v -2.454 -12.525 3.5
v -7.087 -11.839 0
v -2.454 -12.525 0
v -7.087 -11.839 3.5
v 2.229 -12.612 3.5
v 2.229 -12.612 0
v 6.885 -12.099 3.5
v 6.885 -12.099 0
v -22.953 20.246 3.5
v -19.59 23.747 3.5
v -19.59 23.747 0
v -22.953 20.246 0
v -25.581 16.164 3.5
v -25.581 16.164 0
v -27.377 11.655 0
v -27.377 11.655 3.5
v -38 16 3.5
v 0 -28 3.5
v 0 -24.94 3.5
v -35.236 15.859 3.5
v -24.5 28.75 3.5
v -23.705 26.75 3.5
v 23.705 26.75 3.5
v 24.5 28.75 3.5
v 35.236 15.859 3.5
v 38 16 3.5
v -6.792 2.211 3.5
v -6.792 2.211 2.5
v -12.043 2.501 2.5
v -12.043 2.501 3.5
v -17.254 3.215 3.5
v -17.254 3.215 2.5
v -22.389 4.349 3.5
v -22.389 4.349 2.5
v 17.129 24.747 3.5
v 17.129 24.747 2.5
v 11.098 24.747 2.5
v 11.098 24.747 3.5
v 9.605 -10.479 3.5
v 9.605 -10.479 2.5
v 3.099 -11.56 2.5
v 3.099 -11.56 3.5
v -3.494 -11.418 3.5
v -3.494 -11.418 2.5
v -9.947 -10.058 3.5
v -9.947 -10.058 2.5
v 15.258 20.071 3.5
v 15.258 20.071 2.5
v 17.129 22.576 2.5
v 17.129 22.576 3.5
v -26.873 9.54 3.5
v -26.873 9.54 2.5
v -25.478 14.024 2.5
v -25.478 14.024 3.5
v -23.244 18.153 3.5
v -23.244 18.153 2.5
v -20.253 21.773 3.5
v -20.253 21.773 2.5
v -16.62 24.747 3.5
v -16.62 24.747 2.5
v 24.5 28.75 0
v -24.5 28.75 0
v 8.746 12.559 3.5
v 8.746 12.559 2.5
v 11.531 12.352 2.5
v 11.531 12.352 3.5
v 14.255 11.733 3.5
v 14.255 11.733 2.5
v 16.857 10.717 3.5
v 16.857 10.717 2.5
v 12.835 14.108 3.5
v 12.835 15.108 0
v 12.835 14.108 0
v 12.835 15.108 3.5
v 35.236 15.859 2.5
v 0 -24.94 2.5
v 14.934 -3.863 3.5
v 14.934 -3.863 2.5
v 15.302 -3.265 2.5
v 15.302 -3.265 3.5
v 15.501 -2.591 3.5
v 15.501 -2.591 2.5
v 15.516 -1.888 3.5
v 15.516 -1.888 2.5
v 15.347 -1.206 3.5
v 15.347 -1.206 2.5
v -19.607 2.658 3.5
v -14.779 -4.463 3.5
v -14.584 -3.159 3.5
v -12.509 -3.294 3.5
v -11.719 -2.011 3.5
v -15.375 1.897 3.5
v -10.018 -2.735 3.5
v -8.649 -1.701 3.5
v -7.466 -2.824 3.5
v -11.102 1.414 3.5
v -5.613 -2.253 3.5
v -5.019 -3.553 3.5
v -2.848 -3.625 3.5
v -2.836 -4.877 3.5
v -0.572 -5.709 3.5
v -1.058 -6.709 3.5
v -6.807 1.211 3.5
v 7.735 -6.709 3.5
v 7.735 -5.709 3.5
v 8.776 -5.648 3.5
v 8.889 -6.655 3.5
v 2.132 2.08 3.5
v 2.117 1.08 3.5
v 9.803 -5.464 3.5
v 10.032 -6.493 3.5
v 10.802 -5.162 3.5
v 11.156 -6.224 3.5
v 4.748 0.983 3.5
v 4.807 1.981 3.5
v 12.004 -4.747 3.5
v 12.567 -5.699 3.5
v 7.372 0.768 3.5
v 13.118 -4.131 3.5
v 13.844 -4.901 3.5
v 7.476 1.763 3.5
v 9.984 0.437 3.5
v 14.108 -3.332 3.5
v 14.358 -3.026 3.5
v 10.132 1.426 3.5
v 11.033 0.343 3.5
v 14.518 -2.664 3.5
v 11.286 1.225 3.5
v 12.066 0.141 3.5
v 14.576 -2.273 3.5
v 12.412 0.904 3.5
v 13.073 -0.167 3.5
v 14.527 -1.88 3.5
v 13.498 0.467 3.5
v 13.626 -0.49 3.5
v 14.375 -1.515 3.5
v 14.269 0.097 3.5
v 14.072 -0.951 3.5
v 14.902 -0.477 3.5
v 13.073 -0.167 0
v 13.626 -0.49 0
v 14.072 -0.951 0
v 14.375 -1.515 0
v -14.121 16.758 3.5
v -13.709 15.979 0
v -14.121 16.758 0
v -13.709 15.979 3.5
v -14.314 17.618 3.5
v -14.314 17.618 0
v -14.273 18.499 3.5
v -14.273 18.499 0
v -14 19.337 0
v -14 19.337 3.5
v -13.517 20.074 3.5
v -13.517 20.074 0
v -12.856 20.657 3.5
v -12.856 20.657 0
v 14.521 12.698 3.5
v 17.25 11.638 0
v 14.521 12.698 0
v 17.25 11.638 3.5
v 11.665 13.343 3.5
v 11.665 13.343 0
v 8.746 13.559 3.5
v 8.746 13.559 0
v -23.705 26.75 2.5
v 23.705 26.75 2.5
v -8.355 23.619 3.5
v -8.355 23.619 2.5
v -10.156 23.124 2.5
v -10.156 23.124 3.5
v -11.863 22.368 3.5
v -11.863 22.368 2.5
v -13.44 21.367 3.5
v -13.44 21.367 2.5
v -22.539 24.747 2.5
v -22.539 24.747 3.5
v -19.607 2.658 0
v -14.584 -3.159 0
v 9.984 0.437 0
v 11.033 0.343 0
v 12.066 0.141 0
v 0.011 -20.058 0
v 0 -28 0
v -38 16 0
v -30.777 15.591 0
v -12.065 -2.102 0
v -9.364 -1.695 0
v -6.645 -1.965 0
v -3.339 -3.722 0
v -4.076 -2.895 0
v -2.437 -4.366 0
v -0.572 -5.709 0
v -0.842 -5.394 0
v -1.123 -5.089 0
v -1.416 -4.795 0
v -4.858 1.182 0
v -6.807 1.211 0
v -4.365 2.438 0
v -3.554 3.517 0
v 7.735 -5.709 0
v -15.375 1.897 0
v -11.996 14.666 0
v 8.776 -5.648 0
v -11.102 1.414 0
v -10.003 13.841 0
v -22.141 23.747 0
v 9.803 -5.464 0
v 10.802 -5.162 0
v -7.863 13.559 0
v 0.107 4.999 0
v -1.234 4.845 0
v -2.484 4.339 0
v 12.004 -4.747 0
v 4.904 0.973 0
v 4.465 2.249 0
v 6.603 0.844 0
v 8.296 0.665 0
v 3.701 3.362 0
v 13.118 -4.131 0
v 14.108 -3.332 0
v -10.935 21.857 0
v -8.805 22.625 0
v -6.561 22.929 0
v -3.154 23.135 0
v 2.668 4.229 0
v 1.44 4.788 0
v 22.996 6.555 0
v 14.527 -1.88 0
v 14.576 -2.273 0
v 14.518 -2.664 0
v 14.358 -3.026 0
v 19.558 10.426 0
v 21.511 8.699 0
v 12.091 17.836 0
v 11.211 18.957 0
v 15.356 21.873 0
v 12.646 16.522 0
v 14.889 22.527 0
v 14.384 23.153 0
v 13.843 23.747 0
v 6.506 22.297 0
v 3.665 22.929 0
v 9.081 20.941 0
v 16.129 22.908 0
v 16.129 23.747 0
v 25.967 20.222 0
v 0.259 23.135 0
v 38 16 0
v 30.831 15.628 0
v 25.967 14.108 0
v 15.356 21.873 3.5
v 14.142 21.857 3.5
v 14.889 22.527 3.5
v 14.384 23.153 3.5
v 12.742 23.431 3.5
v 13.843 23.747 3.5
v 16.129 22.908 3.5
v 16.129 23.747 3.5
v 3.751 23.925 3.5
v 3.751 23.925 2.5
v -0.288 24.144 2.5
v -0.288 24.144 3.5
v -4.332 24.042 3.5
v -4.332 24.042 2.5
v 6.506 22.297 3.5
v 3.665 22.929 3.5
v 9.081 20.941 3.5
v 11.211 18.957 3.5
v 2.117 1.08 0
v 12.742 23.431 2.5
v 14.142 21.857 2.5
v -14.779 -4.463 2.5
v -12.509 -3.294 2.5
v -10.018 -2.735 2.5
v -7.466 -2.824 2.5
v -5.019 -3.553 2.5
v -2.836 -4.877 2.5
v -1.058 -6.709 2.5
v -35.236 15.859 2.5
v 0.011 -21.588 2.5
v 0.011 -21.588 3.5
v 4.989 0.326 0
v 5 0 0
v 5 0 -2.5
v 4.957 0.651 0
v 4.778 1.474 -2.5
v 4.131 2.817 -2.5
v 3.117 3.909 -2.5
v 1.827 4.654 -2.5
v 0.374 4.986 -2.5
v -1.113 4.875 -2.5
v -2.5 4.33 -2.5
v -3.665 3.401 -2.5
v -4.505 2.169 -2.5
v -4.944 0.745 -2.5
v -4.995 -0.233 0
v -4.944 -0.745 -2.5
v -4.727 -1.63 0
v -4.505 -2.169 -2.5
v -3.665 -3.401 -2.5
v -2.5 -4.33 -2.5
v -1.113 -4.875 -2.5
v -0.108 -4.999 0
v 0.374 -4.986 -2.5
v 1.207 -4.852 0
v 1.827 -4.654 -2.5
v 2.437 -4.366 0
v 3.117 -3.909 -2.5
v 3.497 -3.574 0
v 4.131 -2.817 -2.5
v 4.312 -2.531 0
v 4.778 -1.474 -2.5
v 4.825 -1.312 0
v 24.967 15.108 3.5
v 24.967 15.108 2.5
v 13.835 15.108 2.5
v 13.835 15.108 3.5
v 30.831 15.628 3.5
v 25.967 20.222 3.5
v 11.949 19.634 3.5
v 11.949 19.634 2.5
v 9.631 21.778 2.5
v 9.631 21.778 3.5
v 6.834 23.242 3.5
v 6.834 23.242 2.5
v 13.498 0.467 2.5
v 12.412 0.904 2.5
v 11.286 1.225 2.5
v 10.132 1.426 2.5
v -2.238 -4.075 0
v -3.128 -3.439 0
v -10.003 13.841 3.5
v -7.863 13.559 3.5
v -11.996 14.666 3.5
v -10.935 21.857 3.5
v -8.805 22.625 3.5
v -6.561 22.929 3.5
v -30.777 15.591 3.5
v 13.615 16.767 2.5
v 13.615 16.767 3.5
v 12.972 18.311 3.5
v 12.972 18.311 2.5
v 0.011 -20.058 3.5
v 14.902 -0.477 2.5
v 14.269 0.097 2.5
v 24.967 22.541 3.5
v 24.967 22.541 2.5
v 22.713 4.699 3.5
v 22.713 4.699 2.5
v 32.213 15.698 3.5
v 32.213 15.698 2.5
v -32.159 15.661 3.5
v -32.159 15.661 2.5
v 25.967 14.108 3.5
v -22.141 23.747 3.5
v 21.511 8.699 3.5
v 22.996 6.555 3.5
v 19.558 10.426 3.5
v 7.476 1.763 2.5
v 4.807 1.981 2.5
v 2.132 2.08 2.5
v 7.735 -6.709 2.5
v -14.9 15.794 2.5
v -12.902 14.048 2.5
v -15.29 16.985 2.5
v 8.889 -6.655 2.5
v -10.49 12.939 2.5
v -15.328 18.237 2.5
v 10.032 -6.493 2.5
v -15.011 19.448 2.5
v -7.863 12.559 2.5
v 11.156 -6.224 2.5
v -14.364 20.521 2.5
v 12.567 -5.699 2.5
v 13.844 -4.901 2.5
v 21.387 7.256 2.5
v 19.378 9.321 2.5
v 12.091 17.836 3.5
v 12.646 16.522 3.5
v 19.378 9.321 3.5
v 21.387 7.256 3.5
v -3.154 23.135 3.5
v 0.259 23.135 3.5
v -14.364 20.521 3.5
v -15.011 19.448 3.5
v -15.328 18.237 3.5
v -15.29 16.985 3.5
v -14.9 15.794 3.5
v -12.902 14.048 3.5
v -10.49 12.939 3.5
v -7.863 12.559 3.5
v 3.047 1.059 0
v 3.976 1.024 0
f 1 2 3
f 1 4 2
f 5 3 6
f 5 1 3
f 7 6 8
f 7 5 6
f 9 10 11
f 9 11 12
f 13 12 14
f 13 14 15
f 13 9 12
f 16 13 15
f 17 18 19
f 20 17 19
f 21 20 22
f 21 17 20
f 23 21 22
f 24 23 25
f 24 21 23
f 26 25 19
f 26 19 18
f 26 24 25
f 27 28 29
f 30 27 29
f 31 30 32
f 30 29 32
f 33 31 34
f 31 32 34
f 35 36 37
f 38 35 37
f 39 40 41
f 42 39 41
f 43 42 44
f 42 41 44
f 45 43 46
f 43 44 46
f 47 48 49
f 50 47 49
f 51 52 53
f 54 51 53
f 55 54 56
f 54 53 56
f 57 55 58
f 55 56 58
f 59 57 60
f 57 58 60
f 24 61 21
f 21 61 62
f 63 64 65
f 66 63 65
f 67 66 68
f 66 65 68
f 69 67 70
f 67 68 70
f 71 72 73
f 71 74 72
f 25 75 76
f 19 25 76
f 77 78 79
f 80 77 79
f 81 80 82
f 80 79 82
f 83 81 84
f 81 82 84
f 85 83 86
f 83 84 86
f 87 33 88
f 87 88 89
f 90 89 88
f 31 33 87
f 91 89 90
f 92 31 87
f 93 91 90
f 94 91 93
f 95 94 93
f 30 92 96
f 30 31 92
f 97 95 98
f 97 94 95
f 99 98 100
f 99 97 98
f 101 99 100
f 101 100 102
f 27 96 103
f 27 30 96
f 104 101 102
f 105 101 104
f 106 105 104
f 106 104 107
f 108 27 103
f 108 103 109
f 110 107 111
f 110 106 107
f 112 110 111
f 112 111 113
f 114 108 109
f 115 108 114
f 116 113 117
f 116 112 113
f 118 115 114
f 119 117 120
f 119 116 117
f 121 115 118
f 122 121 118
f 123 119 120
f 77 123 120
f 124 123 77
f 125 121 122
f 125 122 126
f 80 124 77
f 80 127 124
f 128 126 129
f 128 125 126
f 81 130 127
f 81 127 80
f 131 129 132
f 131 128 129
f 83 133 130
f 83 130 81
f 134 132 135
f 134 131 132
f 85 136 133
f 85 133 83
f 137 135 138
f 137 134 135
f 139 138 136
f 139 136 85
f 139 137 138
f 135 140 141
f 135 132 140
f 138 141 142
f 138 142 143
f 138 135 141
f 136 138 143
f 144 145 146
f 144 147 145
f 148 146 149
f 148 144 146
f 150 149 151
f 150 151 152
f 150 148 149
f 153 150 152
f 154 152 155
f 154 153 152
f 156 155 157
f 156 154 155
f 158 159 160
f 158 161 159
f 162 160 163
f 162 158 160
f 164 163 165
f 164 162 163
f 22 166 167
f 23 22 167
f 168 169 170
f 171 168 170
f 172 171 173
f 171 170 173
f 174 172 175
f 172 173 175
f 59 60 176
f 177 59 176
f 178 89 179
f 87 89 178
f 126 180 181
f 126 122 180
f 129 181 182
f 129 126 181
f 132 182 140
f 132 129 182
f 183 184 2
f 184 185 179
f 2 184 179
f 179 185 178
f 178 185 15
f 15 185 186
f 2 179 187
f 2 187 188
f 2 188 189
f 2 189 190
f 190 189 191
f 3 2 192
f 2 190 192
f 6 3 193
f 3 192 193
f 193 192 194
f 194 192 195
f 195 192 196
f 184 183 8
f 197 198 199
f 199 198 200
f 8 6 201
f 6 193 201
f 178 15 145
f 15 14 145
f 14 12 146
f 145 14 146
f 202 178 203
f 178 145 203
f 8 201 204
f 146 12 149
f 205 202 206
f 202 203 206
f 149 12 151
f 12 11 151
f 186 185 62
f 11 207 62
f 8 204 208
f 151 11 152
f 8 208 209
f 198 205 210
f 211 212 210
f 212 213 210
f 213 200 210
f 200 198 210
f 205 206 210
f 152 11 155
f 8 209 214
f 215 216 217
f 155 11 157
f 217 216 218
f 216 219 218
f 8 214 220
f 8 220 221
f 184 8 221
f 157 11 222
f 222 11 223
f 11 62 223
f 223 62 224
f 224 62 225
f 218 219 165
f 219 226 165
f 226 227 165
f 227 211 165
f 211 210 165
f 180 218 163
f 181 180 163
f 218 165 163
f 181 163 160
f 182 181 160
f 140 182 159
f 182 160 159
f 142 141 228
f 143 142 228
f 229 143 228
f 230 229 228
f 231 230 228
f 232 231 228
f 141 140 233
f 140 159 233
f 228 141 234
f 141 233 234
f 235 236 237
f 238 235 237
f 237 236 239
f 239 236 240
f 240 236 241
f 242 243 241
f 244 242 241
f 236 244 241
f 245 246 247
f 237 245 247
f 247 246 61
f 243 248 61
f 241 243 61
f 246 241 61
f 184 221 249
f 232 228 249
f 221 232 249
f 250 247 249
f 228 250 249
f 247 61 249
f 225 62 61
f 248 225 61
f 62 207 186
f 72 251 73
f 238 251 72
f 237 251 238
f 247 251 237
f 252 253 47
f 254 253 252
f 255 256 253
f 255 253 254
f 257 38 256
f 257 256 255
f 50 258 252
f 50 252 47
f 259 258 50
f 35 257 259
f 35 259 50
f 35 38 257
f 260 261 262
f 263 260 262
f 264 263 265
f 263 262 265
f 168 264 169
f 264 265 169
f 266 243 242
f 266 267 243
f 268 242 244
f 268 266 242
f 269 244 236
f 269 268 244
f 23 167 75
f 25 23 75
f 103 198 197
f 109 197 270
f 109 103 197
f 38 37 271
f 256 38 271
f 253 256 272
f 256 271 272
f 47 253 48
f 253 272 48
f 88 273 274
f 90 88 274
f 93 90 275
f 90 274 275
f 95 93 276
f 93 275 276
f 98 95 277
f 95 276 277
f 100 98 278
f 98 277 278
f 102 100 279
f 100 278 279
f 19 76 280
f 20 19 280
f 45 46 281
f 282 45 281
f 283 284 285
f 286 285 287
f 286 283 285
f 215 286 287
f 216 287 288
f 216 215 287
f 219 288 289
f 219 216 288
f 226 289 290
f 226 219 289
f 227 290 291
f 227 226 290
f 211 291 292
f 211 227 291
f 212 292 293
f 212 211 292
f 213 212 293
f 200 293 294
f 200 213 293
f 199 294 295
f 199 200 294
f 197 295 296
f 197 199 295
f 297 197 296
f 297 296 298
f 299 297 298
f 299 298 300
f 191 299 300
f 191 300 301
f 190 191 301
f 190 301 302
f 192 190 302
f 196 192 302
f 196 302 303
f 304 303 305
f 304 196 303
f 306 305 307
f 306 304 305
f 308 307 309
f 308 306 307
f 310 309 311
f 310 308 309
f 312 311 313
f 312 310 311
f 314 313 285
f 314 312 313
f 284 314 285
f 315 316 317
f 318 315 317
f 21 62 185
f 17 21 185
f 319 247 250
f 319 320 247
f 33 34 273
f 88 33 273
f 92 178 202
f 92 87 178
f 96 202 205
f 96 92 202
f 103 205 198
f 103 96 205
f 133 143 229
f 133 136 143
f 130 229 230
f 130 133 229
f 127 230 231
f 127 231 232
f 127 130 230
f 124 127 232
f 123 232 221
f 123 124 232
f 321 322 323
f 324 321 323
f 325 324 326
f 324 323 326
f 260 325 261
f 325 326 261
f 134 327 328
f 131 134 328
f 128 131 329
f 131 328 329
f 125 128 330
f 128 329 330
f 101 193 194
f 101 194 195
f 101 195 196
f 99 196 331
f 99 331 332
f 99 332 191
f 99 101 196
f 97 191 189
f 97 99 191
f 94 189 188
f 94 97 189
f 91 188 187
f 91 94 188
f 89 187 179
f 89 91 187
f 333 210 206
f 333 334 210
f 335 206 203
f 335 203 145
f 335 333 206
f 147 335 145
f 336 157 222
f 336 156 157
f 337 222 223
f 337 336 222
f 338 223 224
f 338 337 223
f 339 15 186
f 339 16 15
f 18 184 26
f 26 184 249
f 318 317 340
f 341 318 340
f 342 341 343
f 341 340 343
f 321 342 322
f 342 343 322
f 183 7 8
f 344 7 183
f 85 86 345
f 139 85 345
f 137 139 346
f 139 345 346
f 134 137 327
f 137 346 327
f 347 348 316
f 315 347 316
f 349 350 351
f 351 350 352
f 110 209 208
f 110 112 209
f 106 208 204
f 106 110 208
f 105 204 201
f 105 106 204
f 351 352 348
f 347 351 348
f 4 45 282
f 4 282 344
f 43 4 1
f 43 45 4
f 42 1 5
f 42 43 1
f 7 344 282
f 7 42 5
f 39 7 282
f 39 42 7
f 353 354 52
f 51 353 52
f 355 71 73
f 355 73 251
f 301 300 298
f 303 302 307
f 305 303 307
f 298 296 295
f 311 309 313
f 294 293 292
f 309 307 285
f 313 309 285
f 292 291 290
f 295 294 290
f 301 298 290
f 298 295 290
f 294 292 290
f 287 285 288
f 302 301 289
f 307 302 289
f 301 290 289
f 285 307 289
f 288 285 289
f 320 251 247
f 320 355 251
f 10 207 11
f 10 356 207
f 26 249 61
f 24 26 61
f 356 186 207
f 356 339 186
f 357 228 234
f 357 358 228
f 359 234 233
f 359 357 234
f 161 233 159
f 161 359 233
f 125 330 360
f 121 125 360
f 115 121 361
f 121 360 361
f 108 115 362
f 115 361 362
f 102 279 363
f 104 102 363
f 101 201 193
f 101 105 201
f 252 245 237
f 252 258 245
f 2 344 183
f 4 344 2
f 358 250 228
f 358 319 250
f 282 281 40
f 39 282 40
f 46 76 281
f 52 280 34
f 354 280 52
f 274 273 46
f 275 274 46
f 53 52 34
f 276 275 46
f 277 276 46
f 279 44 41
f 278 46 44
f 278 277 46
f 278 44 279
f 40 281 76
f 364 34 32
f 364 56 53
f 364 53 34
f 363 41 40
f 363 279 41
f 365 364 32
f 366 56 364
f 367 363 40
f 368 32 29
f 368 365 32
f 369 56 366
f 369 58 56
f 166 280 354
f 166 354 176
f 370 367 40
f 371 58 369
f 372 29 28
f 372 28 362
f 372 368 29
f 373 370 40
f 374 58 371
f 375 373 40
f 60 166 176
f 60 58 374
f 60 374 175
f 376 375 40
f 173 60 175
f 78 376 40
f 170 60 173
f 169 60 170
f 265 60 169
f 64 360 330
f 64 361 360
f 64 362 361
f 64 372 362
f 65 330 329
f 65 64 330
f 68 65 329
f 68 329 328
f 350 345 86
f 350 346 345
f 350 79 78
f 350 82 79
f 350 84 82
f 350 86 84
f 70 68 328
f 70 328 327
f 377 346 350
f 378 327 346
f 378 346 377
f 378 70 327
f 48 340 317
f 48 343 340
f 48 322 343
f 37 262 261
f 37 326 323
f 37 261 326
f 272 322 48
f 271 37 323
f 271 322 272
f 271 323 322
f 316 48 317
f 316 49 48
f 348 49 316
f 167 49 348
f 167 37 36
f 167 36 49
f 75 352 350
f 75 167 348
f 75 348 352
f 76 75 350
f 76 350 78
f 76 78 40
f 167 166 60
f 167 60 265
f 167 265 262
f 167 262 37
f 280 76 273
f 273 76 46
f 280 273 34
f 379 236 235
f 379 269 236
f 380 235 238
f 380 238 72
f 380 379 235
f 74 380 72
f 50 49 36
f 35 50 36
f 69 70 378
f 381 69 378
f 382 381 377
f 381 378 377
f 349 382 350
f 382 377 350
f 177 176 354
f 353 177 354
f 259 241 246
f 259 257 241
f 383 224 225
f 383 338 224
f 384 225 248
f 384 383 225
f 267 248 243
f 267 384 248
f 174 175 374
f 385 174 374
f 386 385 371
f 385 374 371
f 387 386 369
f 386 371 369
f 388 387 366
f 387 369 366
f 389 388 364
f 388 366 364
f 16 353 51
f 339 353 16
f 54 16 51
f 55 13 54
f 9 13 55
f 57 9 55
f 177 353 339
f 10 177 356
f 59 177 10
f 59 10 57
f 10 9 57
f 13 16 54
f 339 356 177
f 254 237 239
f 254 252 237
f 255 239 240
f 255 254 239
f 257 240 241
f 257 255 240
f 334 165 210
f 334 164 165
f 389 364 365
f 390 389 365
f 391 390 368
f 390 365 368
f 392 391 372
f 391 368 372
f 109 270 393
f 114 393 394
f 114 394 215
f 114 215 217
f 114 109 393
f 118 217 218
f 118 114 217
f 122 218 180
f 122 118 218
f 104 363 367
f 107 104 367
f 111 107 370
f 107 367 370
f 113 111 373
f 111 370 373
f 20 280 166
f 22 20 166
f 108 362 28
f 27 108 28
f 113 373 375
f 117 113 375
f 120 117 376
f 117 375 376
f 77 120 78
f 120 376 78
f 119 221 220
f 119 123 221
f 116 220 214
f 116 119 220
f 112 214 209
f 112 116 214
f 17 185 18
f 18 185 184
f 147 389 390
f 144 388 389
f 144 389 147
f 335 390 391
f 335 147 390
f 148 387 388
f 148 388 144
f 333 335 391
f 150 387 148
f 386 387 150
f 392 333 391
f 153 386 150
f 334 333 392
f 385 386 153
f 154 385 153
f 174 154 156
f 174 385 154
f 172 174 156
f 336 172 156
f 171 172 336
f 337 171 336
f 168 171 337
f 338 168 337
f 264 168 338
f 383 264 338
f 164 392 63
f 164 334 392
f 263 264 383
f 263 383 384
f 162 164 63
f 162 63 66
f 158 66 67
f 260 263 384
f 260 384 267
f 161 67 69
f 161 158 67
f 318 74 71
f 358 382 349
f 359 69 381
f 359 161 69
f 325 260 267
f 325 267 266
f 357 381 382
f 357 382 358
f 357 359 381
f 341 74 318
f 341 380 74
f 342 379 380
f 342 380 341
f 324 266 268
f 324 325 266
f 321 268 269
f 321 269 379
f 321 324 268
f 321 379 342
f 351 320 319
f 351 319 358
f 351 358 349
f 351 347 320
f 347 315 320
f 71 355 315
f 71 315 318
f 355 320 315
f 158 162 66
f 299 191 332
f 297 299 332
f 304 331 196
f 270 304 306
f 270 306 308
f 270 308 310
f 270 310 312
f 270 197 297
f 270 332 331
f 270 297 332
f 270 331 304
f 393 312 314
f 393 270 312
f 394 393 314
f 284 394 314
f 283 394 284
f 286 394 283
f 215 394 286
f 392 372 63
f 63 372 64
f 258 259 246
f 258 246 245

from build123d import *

# Parameters (mm, degrees)
F1_DEPTH = 2.5
F3_DEPTH = 1
F4_DEPTH = 2.5
F5_R     = 5
F6_DEPTH = 2.5


with BuildPart() as f1:
    # F0 (on Top) → F1 (new body)
    with BuildSketch(Plane.XY):
        Polygon((24.5, 28.75), (-24.5, 28.75), (-38, 16), (0, -28), (38, 16), align=None)
    extrude(amount=F1_DEPTH)

    # F2 (on face) → F3 (join)
    with BuildSketch(Plane.XY.offset(2.5)):
        Polygon((-24.5, 28.75), (-38, 16), (0, -28), (38, 16), (24.5, 28.75), align=None)
        Polygon((0, -24.9401175045), (-35.2360005395, 15.8594620676), (-23.7048427287, 26.75), (23.7048427287, 26.75), (35.2360005395, 15.8594620676), align=None, mode=Mode.SUBTRACT)
        with BuildLine():
            Line((22.7133916393, 4.6985002576), (32.2128970418, 15.6979275658))
            Line((32.2128970418, 15.6979275658), (24.9667909899, 22.5414721704))
            Line((24.9667909899, 22.5414721704), (24.9667909899, 15.1083281487))
            Line((24.9667909899, 15.1083281487), (13.8348590806, 15.1083281487))
            ThreePointArc((13.8348590806, 15.1083281487), (13.3444397283, 17.5599116804), (11.9486611802, 19.6341766584))
            ThreePointArc((11.9486611802, 19.6341766584), (8.2805304238, 22.6022293507), (3.7511971493, 23.9249765365))
            ThreePointArc((3.7511971493, 23.9249765365), (-2.3107858295, 24.1330407686), (-8.3545236117, 23.6190738634))
            ThreePointArc((-8.3545236117, 23.6190738634), (-11.0235311437, 22.7778125064), (-13.4403547272, 21.3670376688))
            ThreePointArc((-13.4403547272, 21.3670376688), (-15.212702444, 18.8538109385), (-14.9003509432, 15.7944055113))
            ThreePointArc((-14.9003509432, 15.7944055113), (-11.7357211664, 13.4067953643), (-7.8630894423, 12.5592770055))
            Line((-7.8630894423, 12.5592770055), (8.745636791, 12.5592770055))
            ThreePointArc((8.745636791, 12.5592770055), (12.9047041932, 12.0930390125), (16.8573021999, 10.7174705771))
            ThreePointArc((16.8573021999, 10.7174705771), (20.4582682574, 8.3626966604), (22.7133916393, 4.6985002576))
        make_face()
        with BuildLine():
            Line((25.9667909899, 14.1083281487), (25.9667909899, 20.2215367922))
            Line((25.9667909899, 20.2215367922), (30.8308973116, 15.6276585996))
            Line((30.8308973116, 15.6276585996), (22.9958176649, 6.5554611139))
            ThreePointArc((22.9958176649, 6.5554611139), (20.586748465, 9.6210283517), (17.2501383205, 11.6380433846))
            ThreePointArc((17.2501383205, 11.6380433846), (13.1050428541, 13.0729920976), (8.745636791, 13.5592770055))
            Line((8.745636791, 13.5592770055), (-7.8630894423, 13.5592770055))
            ThreePointArc((-7.8630894423, 13.5592770055), (-11.026529119, 14.1881083225), (-13.7089760974, 15.9789901227))
            ThreePointArc((-13.7089760974, 15.9789901227), (-14.2725466885, 18.498722854), (-12.8559581935, 20.6574127078))
            ThreePointArc((-12.8559581935, 20.6574127078), (-9.8904154712, 22.2976951419), (-6.5607260913, 22.9286774993))
            ThreePointArc((-6.5607260913, 22.9286774993), (-1.4477418736, 23.1604030388), (3.6652423441, 22.9286774993))
            ThreePointArc((3.6652423441, 22.9286774993), (7.8388006263, 21.704705466), (11.2106185406, 18.9574267715))
            ThreePointArc((11.2106185406, 18.9574267715), (12.4121725039, 17.1972104778), (12.8348590806, 15.1083281487))
            Line((12.8348590806, 15.1083281487), (12.8348590806, 14.1083281487))
            Line((12.8348590806, 14.1083281487), (25.9667909899, 14.1083281487))
        make_face(mode=Mode.SUBTRACT)
        with BuildLine():
            ThreePointArc((-6.7919120193, 2.210722072), (-14.655775713, 2.8051401774), (-22.3894476737, 4.349161901))
            Line((-22.3894476737, 4.349161901), (-14.7787371056, -4.4632398095))
            ThreePointArc((-14.7787371056, -4.4632398095), (-7.466030983, -2.8237135208), (-1.0576881468, -6.709181238))
            Line((-1.0576881468, -6.709181238), (7.7347876504, -6.709181238))
            ThreePointArc((7.7347876504, -6.709181238), (9.4624521238, -6.5873541357), (11.1559238285, -6.2242839485))
            ThreePointArc((11.1559238285, -6.2242839485), (13.2256284307, -5.3326624688), (14.9340350181, -3.8629642222))
            ThreePointArc((14.9340350181, -3.8629642222), (15.5006827522, -2.59072721), (15.3472675011, -1.2064799666))
            ThreePointArc((15.3472675011, -1.2064799666), (14.6061136564, -0.1669001783), (13.4981097654, 0.4674203519))
            ThreePointArc((13.4981097654, 0.4674203519), (11.8530830846, 1.0796158365), (10.1323601002, 1.4260382698))
            ThreePointArc((10.1323601002, 1.4260382698), (6.1429657723, 1.8869809032), (2.1316759441, 2.0800848343))
            Line((2.1316759441, 2.0800848343), (-6.7919120193, 2.210722072))
        make_face()
        with BuildLine():
            Line((-14.5836983502, -3.1591329101), (-19.6073624646, 2.6577413276))
            ThreePointArc((-19.6073624646, 2.6577413276), (-13.2424037369, 1.6206816287), (-6.8065499924, 1.2108292129))
            Line((-6.8065499924, 1.2108292129), (2.1170379709, 1.0801919752))
            ThreePointArc((2.1170379709, 1.0801919752), (6.0614887398, 0.8903056837), (9.9844088472, 0.4370436152))
            ThreePointArc((9.9844088472, 0.4370436152), (11.5520586297, 0.255045089), (13.0727859214, -0.1669001783))
            ThreePointArc((13.0727859214, -0.1669001783), (13.8649438936, -0.7048016123), (14.3747050315, -1.5153543791))
            ThreePointArc((14.3747050315, -1.5153543791), (14.560516724, -2.4704828367), (14.1075737774, -3.3316675108))
            ThreePointArc((14.1075737774, -3.3316675108), (12.5743410862, -4.4628960627), (10.8017250896, -5.16169006))
            ThreePointArc((10.8017250896, -5.16169006), (9.2924984584, -5.5712350402), (7.7347876504, -5.709181238))
            Line((7.7347876504, -5.709181238), (-0.5720290784, -5.709181238))
            ThreePointArc((-0.5720290784, -5.709181238), (-7.1112455745, -1.8702452534), (-14.5836983502, -3.1591329101))
        make_face(mode=Mode.SUBTRACT)
        with BuildLine():
            ThreePointArc((9.6052747881, -10.4793192543), (-0.2005916003, -11.6422682343), (-9.9472034322, -10.0576472208))
            Line((-9.9472034322, -10.0576472208), (0.0111213288, -21.5883390493))
            Line((0.0111213288, -21.5883390493), (9.6052747881, -10.4793192543))
        make_face()
        with BuildLine():
            Line((0.0111213288, -20.0583978016), (-7.0874587678, -11.8389892686))
            ThreePointArc((-7.0874587678, -11.8389892686), (-0.1135902043, -12.6442154046), (6.8853861251, -12.0987227742))
            Line((6.8853861251, -12.0987227742), (0.0111213288, -20.0583978016))
        make_face(mode=Mode.SUBTRACT)
        with BuildLine():
            Line((-22.5385466175, 24.7468773517), (-32.1588185263, 15.6610649934))
            Line((-32.1588185263, 15.6610649934), (-26.8728109728, 9.5404246683))
            ThreePointArc((-26.8728109728, 9.5404246683), (-23.2437339896, 18.1532901464), (-16.6198182851, 24.7468773517))
            Line((-16.6198182851, 24.7468773517), (-22.5385466175, 24.7468773517))
        make_face()
        with BuildLine():
            Line((-27.3773424364, 11.6545602424), (-30.7768187961, 15.5907960272))
            Line((-30.7768187961, 15.5907960272), (-22.1409679819, 23.7468773517))
            Line((-22.1409679819, 23.7468773517), (-19.5902141433, 23.7468773517))
            ThreePointArc((-19.5902141433, 23.7468773517), (-24.3653920595, 18.2684544483), (-27.3773424364, 11.6545602424))
        make_face(mode=Mode.SUBTRACT)
        with BuildLine():
            Line((17.1290766448, 24.7468773517), (11.0983193584, 24.7468773517))
            ThreePointArc((11.0983193584, 24.7468773517), (13.4752527233, 22.6732988786), (15.2575302327, 20.0707949334))
            Line((15.2575302327, 20.0707949334), (17.1290766448, 22.5761607289))
            Line((17.1290766448, 22.5761607289), (17.1290766448, 24.7468773517))
        make_face()
        with BuildLine():
            Line((16.1290766448, 22.9084316287), (15.3555178299, 21.8728987756))
            ThreePointArc((15.3555178299, 21.8728987756), (14.6412526921, 22.843669283), (13.8432644406, 23.7468773517))
            Line((13.8432644406, 23.7468773517), (16.1290766448, 23.7468773517))
            Line((16.1290766448, 23.7468773517), (16.1290766448, 22.9084316287))
        make_face(mode=Mode.SUBTRACT)
    extrude(amount=F3_DEPTH)

    # F4 (cut): faces of the model
    f4_faces = [f1.faces().sort_by_distance(p)[0] for p in [
        (5.2313020526, 16.7100656125, 2.5),
        (15.2310227717, 23.0949791253, 2.5),
        (-25.9928017911, 17.89640638, 2.5),
        (-0.20025716, -1.5946330551, 2.5),
        (-0.0583233398, -14.9701076081, 2.5),
    ]]
    extrude(f4_faces, amount=-F4_DEPTH, mode=Mode.SUBTRACT)

    # F5 (on Top) → F6 (join)
    with BuildSketch(Plane.XY):
        Circle(F5_R)
    extrude(amount=-F6_DEPTH)


solid = f1.part
